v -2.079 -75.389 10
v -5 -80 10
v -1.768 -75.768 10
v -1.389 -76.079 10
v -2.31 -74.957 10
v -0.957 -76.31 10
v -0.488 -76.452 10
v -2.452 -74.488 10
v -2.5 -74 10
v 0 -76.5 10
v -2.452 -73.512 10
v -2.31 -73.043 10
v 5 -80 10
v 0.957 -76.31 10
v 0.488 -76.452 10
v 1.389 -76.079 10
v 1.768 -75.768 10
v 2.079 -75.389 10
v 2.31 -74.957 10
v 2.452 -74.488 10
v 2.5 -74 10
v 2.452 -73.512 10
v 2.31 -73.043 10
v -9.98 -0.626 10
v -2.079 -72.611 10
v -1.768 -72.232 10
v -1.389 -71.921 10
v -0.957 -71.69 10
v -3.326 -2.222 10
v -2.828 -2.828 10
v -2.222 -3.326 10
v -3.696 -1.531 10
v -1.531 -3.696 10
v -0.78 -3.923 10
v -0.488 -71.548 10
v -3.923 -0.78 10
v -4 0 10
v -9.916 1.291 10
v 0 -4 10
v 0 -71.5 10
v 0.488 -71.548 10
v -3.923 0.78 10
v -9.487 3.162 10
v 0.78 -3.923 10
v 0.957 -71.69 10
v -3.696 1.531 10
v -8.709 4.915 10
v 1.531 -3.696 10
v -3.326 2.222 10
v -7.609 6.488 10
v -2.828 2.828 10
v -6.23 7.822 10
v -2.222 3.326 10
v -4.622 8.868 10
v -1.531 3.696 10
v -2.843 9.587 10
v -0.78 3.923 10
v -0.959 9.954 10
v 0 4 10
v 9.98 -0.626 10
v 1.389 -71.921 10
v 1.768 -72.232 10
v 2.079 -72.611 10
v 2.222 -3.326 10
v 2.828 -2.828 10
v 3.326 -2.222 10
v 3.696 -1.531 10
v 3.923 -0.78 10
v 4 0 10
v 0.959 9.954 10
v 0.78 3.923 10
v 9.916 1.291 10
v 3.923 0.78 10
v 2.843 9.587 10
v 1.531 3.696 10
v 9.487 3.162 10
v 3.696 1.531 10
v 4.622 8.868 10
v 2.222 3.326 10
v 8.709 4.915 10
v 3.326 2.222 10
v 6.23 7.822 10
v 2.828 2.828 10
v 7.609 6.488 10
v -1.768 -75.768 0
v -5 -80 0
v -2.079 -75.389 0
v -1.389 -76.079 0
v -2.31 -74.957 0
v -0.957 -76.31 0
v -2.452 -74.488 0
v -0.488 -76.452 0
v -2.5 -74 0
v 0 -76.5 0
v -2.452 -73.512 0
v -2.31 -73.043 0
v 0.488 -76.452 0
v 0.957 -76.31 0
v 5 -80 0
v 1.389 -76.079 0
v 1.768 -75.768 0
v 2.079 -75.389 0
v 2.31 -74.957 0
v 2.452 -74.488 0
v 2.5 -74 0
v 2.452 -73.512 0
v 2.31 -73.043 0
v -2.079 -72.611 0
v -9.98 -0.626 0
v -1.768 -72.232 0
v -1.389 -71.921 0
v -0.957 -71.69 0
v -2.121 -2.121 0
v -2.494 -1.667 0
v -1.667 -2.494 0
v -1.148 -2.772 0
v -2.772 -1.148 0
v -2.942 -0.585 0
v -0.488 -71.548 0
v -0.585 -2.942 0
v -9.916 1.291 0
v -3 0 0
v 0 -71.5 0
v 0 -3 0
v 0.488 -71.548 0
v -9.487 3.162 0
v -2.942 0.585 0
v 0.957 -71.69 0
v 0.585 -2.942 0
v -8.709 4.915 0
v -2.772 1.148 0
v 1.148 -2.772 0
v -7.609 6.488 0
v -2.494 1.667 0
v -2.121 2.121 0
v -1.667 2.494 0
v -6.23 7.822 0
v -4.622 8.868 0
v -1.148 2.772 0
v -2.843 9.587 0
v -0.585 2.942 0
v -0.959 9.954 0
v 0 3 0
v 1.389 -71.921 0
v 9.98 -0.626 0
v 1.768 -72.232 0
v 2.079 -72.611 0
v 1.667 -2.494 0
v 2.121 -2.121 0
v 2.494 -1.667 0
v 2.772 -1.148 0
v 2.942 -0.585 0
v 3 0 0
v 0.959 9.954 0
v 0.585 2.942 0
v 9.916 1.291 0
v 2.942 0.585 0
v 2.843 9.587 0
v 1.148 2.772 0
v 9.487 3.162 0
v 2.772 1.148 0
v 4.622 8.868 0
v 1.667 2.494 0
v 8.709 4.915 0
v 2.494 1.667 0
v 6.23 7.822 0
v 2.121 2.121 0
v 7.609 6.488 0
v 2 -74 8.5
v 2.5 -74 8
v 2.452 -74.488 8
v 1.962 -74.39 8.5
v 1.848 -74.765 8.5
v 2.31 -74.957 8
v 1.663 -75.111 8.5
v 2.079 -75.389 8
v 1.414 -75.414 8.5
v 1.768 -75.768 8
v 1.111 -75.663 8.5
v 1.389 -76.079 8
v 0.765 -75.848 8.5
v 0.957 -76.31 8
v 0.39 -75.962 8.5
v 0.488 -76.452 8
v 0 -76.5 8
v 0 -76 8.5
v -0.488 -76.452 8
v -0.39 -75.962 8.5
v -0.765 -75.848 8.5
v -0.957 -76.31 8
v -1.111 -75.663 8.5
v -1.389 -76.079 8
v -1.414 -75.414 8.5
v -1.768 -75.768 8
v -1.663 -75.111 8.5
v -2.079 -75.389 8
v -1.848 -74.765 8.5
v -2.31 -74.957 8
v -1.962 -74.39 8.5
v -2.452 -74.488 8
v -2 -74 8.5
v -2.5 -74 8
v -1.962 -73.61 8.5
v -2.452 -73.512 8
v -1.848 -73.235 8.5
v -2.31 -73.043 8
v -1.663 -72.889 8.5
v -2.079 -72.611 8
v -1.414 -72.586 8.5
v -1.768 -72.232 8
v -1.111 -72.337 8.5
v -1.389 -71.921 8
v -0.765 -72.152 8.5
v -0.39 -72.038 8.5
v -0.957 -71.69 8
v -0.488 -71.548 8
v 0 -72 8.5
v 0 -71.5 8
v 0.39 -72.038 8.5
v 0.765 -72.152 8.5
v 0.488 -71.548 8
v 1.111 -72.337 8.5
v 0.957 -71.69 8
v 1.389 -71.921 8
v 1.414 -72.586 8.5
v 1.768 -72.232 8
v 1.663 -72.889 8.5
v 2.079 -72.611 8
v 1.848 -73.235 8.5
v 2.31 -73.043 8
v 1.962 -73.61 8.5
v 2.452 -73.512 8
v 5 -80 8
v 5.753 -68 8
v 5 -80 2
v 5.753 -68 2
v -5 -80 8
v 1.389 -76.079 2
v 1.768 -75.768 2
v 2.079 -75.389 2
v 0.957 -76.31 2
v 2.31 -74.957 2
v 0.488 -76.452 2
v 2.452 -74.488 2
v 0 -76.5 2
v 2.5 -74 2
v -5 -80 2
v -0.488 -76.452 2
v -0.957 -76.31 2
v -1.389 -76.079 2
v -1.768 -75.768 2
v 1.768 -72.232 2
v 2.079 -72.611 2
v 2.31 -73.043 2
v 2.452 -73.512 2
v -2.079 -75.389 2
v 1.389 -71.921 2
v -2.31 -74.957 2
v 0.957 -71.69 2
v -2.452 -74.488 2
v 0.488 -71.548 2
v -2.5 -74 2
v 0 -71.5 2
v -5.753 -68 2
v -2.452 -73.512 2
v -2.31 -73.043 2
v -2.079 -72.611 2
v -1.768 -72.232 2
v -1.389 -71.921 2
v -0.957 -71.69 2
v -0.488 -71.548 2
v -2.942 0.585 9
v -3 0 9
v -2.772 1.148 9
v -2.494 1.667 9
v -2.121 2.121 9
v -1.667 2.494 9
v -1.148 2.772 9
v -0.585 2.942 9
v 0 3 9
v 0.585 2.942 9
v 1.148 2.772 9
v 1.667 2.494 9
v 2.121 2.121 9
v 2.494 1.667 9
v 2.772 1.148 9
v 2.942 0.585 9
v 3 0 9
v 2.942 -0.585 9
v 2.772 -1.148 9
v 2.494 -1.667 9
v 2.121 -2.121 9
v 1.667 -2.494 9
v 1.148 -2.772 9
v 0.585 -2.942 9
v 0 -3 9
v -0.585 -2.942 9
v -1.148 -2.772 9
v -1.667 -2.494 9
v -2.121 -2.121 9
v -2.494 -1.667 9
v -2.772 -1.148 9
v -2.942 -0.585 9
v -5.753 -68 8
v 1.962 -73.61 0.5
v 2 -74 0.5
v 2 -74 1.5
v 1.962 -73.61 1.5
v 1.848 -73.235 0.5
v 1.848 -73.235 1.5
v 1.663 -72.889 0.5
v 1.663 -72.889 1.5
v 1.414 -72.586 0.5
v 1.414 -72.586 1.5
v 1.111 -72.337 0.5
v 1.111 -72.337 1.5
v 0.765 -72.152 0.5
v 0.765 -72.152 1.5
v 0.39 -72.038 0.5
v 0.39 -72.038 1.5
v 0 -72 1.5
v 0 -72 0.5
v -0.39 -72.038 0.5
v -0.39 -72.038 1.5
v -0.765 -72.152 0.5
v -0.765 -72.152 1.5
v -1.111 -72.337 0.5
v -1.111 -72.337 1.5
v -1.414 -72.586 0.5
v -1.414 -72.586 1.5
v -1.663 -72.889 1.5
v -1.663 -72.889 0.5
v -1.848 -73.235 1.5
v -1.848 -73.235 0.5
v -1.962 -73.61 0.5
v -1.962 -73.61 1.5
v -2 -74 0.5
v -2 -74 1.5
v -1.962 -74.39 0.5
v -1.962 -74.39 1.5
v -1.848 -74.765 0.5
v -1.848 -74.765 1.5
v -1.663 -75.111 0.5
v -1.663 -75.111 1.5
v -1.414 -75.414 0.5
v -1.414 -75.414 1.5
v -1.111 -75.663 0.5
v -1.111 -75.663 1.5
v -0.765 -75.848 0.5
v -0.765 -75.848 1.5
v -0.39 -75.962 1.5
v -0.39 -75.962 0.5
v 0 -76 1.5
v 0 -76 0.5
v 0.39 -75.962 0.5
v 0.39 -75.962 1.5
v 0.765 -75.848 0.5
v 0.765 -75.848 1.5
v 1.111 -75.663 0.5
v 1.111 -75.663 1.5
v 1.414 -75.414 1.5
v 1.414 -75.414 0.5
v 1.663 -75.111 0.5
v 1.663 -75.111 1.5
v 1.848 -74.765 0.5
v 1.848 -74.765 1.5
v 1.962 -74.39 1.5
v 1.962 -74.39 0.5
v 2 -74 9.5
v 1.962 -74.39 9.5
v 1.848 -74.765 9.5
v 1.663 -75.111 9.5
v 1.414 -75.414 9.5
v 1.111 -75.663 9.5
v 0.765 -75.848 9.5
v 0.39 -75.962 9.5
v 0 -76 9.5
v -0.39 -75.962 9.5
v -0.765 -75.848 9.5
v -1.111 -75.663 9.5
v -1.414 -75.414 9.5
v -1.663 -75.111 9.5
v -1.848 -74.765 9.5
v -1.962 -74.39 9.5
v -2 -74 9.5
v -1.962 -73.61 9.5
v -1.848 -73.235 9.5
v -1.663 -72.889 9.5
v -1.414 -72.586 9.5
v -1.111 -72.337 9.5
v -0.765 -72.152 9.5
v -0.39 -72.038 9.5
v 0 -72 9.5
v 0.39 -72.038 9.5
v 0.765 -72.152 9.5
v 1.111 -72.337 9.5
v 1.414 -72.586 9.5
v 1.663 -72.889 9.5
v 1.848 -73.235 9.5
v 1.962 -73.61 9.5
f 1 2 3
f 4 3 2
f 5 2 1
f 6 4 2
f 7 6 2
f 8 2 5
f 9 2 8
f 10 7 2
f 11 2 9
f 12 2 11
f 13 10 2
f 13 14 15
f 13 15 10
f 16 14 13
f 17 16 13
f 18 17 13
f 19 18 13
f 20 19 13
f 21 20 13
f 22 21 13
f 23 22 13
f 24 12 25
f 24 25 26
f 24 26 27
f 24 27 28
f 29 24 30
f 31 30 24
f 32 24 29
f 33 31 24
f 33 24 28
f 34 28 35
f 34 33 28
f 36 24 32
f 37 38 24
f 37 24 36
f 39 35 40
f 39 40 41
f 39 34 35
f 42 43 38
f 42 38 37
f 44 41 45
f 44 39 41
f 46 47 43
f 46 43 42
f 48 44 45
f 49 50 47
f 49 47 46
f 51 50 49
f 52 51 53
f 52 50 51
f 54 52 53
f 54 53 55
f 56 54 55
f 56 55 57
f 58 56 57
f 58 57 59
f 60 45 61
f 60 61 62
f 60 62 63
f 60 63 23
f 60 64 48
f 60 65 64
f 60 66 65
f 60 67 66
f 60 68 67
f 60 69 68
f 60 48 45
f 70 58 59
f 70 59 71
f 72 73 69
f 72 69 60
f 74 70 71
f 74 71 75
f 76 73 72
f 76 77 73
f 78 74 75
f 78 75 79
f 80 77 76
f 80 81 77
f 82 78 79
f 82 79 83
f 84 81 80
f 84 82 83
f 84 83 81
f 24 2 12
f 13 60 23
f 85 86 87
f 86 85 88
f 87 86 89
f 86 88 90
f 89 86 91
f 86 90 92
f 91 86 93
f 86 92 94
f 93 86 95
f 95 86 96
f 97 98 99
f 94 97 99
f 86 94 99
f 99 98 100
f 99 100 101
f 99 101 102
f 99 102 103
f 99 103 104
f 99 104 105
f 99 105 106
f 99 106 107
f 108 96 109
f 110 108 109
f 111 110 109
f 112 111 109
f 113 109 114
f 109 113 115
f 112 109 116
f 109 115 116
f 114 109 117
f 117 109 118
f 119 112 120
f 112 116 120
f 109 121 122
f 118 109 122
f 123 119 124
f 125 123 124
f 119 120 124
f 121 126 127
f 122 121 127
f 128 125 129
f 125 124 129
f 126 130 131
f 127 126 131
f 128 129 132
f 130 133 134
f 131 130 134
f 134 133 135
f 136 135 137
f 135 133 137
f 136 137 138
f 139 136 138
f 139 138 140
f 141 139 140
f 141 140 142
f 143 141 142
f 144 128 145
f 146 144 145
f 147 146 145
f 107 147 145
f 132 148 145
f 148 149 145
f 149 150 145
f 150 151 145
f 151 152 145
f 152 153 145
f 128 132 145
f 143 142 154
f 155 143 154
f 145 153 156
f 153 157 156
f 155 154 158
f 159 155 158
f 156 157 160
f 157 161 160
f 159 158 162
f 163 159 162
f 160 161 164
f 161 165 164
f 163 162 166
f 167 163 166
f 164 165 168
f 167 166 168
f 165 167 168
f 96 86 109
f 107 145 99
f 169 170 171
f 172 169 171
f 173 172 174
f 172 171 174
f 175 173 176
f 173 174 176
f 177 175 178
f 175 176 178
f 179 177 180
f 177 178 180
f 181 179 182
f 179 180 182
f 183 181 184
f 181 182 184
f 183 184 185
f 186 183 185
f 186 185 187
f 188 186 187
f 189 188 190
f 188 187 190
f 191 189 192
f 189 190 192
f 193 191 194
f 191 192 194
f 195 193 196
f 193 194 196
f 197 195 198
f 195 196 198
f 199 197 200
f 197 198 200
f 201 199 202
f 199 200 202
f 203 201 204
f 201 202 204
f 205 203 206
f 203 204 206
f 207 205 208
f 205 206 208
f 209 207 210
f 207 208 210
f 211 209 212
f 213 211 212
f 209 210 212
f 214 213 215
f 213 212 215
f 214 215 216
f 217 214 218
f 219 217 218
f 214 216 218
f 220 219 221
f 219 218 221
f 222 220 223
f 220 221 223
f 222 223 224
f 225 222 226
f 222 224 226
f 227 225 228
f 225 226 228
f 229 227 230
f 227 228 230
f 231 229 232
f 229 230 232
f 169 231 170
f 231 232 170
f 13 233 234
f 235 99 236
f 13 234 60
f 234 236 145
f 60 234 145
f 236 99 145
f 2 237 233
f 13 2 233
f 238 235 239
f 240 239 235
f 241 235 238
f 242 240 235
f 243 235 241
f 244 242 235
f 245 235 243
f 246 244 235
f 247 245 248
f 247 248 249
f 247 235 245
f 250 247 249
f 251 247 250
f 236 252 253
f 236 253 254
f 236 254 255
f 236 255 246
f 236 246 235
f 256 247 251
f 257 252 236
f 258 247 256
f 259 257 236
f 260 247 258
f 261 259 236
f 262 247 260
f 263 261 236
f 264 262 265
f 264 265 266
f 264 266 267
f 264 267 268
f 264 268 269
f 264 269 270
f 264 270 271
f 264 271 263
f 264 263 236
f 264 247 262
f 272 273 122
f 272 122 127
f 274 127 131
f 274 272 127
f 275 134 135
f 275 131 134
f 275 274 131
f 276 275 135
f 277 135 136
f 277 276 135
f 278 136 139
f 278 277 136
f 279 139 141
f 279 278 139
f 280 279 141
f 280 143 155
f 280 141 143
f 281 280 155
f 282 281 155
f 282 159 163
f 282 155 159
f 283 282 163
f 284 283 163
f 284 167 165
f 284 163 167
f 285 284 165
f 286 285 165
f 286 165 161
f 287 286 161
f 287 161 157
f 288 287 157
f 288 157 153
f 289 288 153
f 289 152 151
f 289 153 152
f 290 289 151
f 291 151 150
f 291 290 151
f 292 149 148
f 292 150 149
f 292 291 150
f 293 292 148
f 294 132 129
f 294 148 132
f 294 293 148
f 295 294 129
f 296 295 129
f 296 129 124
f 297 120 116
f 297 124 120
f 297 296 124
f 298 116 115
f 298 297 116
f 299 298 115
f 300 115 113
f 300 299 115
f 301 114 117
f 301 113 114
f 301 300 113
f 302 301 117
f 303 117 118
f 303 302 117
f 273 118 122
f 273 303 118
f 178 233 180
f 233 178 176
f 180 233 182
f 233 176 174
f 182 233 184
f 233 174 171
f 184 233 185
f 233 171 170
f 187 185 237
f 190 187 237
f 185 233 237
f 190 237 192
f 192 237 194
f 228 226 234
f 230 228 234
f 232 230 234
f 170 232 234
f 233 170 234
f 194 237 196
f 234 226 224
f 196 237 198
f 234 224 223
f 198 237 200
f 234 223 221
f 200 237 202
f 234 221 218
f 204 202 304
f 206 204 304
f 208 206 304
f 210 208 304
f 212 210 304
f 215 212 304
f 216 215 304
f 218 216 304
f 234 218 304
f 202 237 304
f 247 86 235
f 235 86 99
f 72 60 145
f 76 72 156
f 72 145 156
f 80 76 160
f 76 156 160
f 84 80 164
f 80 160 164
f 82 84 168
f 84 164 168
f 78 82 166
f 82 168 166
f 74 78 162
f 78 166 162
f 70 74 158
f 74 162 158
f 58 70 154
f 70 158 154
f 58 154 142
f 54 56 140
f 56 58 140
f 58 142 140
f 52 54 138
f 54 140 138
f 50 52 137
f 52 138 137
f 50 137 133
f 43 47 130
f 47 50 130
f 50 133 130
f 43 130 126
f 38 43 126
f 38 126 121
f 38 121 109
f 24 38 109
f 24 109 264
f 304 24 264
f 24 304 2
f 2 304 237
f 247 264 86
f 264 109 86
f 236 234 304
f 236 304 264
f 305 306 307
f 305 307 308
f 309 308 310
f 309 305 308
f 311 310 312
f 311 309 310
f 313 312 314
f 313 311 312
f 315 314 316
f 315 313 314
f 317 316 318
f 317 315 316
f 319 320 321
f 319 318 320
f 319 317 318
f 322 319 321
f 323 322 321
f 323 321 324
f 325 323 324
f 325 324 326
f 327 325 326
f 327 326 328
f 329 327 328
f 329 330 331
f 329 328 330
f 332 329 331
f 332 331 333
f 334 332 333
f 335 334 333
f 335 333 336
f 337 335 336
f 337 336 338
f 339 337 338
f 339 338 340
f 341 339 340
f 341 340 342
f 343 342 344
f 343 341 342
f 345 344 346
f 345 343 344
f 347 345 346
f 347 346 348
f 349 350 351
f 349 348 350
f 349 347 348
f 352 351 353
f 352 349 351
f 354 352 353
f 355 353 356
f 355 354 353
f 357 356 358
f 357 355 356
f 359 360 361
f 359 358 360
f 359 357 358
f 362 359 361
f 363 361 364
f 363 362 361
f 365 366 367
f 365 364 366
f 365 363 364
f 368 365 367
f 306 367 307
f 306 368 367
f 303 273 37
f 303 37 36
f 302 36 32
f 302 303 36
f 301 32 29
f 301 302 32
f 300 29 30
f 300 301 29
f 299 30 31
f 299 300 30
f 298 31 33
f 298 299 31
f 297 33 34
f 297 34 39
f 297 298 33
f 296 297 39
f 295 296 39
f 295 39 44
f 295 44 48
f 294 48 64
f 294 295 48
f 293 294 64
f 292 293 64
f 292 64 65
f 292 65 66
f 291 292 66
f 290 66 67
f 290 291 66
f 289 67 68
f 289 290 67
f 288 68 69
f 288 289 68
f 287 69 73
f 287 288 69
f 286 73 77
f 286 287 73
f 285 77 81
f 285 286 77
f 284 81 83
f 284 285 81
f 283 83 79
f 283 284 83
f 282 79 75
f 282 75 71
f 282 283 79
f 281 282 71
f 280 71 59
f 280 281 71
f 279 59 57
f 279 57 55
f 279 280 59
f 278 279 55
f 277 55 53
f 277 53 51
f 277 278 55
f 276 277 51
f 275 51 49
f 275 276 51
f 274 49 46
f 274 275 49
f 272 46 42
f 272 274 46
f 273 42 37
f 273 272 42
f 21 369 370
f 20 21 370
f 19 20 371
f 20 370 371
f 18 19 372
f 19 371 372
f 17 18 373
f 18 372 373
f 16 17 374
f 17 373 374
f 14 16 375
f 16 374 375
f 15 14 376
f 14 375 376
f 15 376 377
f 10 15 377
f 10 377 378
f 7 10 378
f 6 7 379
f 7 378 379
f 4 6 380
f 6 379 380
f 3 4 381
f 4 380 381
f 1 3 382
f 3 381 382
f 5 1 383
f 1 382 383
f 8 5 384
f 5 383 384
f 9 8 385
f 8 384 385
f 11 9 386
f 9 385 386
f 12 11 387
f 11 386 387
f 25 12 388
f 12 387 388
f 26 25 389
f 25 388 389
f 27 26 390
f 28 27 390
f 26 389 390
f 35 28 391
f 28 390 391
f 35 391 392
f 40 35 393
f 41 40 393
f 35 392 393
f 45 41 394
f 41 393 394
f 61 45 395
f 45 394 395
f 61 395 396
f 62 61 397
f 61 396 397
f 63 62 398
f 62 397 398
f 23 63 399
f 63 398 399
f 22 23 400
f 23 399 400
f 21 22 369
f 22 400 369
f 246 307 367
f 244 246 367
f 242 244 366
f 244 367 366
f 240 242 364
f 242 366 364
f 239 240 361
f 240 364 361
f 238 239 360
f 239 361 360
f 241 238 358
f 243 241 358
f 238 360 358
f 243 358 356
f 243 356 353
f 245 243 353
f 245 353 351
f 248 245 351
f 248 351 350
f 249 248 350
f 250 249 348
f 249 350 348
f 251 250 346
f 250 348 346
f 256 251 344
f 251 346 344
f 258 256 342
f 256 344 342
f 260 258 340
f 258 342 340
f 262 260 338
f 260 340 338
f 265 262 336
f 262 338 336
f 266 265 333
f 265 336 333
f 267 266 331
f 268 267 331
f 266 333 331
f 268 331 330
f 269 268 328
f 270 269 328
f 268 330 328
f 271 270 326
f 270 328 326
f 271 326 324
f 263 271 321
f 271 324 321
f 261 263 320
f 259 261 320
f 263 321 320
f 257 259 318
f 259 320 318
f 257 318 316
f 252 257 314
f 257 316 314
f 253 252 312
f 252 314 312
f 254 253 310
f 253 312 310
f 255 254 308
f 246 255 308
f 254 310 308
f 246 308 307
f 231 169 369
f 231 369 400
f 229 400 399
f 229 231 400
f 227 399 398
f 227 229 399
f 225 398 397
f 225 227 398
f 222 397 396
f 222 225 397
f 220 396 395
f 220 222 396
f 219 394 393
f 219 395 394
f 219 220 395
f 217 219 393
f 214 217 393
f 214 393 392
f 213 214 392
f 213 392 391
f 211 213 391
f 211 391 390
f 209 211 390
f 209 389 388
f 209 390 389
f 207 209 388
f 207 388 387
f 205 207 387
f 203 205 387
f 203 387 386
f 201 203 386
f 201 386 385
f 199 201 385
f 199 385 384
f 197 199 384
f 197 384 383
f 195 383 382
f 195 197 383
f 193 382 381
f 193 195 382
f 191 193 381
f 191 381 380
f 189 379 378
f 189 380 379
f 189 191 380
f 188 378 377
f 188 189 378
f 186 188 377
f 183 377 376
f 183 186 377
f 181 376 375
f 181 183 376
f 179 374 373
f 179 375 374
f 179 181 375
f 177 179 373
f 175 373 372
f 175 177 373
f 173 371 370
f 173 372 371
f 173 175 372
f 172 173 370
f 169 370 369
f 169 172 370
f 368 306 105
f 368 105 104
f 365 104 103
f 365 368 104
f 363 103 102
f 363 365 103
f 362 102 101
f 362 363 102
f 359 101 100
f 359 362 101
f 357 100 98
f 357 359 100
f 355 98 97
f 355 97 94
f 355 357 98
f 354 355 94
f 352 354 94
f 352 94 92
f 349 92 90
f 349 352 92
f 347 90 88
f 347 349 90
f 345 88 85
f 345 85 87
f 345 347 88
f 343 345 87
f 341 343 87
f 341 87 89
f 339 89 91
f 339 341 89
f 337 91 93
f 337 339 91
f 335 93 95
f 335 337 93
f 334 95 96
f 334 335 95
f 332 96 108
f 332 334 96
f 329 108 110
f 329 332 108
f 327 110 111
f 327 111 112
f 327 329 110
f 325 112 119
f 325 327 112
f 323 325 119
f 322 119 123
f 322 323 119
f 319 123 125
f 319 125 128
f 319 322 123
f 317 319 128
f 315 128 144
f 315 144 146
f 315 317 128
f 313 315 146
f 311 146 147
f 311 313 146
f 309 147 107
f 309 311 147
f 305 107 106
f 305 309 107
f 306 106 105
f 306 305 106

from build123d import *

# Parameters (mm, degrees)
SKETCH_1_R               = 10
EXTRUDE_1_DEPTH          = 10
EXTRUDE_2_DEPTH          = 10
CUT_EXTRUDE_2_DEPTH      = 81.925892025
CUT_EXTRUDE_2_DEPTH_BACK = 81.925892025
SKETCH_3_R               = 3
CUT_EXTRUDE_3_DEPTH      = 82.240384046
CUT_EXTRUDE_3_DEPTH_BACK = 82.240384046
SKETCH_7_W               = 6
SKETCH_7_H               = 16
CUT_EXTRUDE_4_DEPTH      = 82.240384046
CUT_EXTRUDE_4_DEPTH_BACK = 82.240384046
SKETCH_8_R               = 2
CHAMFER_1_SIZE           = 1
CHAMFER_2_SIZE           = 0.5


with BuildPart() as part:
    # 草图1 → 凸台-拉伸1 (new body)
    with BuildSketch(Plane.XY):
        Circle(SKETCH_1_R)
    extrude(amount=EXTRUDE_1_DEPTH)

    # 草图2 → 凸台-拉伸2 (add)
    with BuildSketch(Plane.XY):
        with BuildLine():
            Line((-9.980372744, -0.626226703), (-5, -80))
            Line((-5, -80), (5, -80))
            Line((5, -80), (9.980372744, -0.626226703))
            ThreePointArc((9.980372744, -0.626226703), (0, -10), (-9.980372744, -0.626226703))
        make_face()
    extrude(amount=EXTRUDE_2_DEPTH)

    # 草图3 → 切除-拉伸2 (cut, two sides: drawn at the far end of the back side and taken through both)
    with BuildSketch(Plane(origin=(0, 0, 3), x_dir=(-1, 0, 0), z_dir=(0, 0, -1)).offset(-CUT_EXTRUDE_2_DEPTH_BACK)):
        Circle(SKETCH_3_R)
    extrude(amount=CUT_EXTRUDE_2_DEPTH + CUT_EXTRUDE_2_DEPTH_BACK, mode=Mode.SUBTRACT)

    # 草图7 → 切除-拉伸3 (cut, two sides: drawn at the far end of the back side and taken through both)
    with BuildSketch(Plane(origin=(0, 0, 0), x_dir=(0, 0, -1), z_dir=(1, 0, 0)).offset(-CUT_EXTRUDE_3_DEPTH_BACK)):
        with Locations((-5, -76)):
            Rectangle(SKETCH_7_W, SKETCH_7_H)
    extrude(amount=CUT_EXTRUDE_3_DEPTH + CUT_EXTRUDE_3_DEPTH_BACK, mode=Mode.SUBTRACT)

    # 草图8 → 切除-拉伸4 (cut, two sides: drawn at the far end of the back side and taken through both)
    with BuildSketch(Plane.XY.offset(10).offset(-CUT_EXTRUDE_4_DEPTH_BACK)):
        with Locations((0, -74)):
            Circle(SKETCH_8_R)
    extrude(amount=CUT_EXTRUDE_4_DEPTH + CUT_EXTRUDE_4_DEPTH_BACK, mode=Mode.SUBTRACT)

    # 倒角1
    chamfer_1_edges = [part.edges().sort_by_distance(p)[0] for p in [
        (3, 0, 10),
    ]]
    chamfer(chamfer_1_edges, length=CHAMFER_1_SIZE)

    # 倒角2
    chamfer_2_edges = [part.edges().sort_by_distance(p)[0] for p in [
        (-2, -74, 10),
        (-2, -74, 8),
        (-2, -74, 0),
        (-2, -74, 2),
    ]]
    chamfer(chamfer_2_edges, length=CHAMFER_2_SIZE)


solid = part.part
